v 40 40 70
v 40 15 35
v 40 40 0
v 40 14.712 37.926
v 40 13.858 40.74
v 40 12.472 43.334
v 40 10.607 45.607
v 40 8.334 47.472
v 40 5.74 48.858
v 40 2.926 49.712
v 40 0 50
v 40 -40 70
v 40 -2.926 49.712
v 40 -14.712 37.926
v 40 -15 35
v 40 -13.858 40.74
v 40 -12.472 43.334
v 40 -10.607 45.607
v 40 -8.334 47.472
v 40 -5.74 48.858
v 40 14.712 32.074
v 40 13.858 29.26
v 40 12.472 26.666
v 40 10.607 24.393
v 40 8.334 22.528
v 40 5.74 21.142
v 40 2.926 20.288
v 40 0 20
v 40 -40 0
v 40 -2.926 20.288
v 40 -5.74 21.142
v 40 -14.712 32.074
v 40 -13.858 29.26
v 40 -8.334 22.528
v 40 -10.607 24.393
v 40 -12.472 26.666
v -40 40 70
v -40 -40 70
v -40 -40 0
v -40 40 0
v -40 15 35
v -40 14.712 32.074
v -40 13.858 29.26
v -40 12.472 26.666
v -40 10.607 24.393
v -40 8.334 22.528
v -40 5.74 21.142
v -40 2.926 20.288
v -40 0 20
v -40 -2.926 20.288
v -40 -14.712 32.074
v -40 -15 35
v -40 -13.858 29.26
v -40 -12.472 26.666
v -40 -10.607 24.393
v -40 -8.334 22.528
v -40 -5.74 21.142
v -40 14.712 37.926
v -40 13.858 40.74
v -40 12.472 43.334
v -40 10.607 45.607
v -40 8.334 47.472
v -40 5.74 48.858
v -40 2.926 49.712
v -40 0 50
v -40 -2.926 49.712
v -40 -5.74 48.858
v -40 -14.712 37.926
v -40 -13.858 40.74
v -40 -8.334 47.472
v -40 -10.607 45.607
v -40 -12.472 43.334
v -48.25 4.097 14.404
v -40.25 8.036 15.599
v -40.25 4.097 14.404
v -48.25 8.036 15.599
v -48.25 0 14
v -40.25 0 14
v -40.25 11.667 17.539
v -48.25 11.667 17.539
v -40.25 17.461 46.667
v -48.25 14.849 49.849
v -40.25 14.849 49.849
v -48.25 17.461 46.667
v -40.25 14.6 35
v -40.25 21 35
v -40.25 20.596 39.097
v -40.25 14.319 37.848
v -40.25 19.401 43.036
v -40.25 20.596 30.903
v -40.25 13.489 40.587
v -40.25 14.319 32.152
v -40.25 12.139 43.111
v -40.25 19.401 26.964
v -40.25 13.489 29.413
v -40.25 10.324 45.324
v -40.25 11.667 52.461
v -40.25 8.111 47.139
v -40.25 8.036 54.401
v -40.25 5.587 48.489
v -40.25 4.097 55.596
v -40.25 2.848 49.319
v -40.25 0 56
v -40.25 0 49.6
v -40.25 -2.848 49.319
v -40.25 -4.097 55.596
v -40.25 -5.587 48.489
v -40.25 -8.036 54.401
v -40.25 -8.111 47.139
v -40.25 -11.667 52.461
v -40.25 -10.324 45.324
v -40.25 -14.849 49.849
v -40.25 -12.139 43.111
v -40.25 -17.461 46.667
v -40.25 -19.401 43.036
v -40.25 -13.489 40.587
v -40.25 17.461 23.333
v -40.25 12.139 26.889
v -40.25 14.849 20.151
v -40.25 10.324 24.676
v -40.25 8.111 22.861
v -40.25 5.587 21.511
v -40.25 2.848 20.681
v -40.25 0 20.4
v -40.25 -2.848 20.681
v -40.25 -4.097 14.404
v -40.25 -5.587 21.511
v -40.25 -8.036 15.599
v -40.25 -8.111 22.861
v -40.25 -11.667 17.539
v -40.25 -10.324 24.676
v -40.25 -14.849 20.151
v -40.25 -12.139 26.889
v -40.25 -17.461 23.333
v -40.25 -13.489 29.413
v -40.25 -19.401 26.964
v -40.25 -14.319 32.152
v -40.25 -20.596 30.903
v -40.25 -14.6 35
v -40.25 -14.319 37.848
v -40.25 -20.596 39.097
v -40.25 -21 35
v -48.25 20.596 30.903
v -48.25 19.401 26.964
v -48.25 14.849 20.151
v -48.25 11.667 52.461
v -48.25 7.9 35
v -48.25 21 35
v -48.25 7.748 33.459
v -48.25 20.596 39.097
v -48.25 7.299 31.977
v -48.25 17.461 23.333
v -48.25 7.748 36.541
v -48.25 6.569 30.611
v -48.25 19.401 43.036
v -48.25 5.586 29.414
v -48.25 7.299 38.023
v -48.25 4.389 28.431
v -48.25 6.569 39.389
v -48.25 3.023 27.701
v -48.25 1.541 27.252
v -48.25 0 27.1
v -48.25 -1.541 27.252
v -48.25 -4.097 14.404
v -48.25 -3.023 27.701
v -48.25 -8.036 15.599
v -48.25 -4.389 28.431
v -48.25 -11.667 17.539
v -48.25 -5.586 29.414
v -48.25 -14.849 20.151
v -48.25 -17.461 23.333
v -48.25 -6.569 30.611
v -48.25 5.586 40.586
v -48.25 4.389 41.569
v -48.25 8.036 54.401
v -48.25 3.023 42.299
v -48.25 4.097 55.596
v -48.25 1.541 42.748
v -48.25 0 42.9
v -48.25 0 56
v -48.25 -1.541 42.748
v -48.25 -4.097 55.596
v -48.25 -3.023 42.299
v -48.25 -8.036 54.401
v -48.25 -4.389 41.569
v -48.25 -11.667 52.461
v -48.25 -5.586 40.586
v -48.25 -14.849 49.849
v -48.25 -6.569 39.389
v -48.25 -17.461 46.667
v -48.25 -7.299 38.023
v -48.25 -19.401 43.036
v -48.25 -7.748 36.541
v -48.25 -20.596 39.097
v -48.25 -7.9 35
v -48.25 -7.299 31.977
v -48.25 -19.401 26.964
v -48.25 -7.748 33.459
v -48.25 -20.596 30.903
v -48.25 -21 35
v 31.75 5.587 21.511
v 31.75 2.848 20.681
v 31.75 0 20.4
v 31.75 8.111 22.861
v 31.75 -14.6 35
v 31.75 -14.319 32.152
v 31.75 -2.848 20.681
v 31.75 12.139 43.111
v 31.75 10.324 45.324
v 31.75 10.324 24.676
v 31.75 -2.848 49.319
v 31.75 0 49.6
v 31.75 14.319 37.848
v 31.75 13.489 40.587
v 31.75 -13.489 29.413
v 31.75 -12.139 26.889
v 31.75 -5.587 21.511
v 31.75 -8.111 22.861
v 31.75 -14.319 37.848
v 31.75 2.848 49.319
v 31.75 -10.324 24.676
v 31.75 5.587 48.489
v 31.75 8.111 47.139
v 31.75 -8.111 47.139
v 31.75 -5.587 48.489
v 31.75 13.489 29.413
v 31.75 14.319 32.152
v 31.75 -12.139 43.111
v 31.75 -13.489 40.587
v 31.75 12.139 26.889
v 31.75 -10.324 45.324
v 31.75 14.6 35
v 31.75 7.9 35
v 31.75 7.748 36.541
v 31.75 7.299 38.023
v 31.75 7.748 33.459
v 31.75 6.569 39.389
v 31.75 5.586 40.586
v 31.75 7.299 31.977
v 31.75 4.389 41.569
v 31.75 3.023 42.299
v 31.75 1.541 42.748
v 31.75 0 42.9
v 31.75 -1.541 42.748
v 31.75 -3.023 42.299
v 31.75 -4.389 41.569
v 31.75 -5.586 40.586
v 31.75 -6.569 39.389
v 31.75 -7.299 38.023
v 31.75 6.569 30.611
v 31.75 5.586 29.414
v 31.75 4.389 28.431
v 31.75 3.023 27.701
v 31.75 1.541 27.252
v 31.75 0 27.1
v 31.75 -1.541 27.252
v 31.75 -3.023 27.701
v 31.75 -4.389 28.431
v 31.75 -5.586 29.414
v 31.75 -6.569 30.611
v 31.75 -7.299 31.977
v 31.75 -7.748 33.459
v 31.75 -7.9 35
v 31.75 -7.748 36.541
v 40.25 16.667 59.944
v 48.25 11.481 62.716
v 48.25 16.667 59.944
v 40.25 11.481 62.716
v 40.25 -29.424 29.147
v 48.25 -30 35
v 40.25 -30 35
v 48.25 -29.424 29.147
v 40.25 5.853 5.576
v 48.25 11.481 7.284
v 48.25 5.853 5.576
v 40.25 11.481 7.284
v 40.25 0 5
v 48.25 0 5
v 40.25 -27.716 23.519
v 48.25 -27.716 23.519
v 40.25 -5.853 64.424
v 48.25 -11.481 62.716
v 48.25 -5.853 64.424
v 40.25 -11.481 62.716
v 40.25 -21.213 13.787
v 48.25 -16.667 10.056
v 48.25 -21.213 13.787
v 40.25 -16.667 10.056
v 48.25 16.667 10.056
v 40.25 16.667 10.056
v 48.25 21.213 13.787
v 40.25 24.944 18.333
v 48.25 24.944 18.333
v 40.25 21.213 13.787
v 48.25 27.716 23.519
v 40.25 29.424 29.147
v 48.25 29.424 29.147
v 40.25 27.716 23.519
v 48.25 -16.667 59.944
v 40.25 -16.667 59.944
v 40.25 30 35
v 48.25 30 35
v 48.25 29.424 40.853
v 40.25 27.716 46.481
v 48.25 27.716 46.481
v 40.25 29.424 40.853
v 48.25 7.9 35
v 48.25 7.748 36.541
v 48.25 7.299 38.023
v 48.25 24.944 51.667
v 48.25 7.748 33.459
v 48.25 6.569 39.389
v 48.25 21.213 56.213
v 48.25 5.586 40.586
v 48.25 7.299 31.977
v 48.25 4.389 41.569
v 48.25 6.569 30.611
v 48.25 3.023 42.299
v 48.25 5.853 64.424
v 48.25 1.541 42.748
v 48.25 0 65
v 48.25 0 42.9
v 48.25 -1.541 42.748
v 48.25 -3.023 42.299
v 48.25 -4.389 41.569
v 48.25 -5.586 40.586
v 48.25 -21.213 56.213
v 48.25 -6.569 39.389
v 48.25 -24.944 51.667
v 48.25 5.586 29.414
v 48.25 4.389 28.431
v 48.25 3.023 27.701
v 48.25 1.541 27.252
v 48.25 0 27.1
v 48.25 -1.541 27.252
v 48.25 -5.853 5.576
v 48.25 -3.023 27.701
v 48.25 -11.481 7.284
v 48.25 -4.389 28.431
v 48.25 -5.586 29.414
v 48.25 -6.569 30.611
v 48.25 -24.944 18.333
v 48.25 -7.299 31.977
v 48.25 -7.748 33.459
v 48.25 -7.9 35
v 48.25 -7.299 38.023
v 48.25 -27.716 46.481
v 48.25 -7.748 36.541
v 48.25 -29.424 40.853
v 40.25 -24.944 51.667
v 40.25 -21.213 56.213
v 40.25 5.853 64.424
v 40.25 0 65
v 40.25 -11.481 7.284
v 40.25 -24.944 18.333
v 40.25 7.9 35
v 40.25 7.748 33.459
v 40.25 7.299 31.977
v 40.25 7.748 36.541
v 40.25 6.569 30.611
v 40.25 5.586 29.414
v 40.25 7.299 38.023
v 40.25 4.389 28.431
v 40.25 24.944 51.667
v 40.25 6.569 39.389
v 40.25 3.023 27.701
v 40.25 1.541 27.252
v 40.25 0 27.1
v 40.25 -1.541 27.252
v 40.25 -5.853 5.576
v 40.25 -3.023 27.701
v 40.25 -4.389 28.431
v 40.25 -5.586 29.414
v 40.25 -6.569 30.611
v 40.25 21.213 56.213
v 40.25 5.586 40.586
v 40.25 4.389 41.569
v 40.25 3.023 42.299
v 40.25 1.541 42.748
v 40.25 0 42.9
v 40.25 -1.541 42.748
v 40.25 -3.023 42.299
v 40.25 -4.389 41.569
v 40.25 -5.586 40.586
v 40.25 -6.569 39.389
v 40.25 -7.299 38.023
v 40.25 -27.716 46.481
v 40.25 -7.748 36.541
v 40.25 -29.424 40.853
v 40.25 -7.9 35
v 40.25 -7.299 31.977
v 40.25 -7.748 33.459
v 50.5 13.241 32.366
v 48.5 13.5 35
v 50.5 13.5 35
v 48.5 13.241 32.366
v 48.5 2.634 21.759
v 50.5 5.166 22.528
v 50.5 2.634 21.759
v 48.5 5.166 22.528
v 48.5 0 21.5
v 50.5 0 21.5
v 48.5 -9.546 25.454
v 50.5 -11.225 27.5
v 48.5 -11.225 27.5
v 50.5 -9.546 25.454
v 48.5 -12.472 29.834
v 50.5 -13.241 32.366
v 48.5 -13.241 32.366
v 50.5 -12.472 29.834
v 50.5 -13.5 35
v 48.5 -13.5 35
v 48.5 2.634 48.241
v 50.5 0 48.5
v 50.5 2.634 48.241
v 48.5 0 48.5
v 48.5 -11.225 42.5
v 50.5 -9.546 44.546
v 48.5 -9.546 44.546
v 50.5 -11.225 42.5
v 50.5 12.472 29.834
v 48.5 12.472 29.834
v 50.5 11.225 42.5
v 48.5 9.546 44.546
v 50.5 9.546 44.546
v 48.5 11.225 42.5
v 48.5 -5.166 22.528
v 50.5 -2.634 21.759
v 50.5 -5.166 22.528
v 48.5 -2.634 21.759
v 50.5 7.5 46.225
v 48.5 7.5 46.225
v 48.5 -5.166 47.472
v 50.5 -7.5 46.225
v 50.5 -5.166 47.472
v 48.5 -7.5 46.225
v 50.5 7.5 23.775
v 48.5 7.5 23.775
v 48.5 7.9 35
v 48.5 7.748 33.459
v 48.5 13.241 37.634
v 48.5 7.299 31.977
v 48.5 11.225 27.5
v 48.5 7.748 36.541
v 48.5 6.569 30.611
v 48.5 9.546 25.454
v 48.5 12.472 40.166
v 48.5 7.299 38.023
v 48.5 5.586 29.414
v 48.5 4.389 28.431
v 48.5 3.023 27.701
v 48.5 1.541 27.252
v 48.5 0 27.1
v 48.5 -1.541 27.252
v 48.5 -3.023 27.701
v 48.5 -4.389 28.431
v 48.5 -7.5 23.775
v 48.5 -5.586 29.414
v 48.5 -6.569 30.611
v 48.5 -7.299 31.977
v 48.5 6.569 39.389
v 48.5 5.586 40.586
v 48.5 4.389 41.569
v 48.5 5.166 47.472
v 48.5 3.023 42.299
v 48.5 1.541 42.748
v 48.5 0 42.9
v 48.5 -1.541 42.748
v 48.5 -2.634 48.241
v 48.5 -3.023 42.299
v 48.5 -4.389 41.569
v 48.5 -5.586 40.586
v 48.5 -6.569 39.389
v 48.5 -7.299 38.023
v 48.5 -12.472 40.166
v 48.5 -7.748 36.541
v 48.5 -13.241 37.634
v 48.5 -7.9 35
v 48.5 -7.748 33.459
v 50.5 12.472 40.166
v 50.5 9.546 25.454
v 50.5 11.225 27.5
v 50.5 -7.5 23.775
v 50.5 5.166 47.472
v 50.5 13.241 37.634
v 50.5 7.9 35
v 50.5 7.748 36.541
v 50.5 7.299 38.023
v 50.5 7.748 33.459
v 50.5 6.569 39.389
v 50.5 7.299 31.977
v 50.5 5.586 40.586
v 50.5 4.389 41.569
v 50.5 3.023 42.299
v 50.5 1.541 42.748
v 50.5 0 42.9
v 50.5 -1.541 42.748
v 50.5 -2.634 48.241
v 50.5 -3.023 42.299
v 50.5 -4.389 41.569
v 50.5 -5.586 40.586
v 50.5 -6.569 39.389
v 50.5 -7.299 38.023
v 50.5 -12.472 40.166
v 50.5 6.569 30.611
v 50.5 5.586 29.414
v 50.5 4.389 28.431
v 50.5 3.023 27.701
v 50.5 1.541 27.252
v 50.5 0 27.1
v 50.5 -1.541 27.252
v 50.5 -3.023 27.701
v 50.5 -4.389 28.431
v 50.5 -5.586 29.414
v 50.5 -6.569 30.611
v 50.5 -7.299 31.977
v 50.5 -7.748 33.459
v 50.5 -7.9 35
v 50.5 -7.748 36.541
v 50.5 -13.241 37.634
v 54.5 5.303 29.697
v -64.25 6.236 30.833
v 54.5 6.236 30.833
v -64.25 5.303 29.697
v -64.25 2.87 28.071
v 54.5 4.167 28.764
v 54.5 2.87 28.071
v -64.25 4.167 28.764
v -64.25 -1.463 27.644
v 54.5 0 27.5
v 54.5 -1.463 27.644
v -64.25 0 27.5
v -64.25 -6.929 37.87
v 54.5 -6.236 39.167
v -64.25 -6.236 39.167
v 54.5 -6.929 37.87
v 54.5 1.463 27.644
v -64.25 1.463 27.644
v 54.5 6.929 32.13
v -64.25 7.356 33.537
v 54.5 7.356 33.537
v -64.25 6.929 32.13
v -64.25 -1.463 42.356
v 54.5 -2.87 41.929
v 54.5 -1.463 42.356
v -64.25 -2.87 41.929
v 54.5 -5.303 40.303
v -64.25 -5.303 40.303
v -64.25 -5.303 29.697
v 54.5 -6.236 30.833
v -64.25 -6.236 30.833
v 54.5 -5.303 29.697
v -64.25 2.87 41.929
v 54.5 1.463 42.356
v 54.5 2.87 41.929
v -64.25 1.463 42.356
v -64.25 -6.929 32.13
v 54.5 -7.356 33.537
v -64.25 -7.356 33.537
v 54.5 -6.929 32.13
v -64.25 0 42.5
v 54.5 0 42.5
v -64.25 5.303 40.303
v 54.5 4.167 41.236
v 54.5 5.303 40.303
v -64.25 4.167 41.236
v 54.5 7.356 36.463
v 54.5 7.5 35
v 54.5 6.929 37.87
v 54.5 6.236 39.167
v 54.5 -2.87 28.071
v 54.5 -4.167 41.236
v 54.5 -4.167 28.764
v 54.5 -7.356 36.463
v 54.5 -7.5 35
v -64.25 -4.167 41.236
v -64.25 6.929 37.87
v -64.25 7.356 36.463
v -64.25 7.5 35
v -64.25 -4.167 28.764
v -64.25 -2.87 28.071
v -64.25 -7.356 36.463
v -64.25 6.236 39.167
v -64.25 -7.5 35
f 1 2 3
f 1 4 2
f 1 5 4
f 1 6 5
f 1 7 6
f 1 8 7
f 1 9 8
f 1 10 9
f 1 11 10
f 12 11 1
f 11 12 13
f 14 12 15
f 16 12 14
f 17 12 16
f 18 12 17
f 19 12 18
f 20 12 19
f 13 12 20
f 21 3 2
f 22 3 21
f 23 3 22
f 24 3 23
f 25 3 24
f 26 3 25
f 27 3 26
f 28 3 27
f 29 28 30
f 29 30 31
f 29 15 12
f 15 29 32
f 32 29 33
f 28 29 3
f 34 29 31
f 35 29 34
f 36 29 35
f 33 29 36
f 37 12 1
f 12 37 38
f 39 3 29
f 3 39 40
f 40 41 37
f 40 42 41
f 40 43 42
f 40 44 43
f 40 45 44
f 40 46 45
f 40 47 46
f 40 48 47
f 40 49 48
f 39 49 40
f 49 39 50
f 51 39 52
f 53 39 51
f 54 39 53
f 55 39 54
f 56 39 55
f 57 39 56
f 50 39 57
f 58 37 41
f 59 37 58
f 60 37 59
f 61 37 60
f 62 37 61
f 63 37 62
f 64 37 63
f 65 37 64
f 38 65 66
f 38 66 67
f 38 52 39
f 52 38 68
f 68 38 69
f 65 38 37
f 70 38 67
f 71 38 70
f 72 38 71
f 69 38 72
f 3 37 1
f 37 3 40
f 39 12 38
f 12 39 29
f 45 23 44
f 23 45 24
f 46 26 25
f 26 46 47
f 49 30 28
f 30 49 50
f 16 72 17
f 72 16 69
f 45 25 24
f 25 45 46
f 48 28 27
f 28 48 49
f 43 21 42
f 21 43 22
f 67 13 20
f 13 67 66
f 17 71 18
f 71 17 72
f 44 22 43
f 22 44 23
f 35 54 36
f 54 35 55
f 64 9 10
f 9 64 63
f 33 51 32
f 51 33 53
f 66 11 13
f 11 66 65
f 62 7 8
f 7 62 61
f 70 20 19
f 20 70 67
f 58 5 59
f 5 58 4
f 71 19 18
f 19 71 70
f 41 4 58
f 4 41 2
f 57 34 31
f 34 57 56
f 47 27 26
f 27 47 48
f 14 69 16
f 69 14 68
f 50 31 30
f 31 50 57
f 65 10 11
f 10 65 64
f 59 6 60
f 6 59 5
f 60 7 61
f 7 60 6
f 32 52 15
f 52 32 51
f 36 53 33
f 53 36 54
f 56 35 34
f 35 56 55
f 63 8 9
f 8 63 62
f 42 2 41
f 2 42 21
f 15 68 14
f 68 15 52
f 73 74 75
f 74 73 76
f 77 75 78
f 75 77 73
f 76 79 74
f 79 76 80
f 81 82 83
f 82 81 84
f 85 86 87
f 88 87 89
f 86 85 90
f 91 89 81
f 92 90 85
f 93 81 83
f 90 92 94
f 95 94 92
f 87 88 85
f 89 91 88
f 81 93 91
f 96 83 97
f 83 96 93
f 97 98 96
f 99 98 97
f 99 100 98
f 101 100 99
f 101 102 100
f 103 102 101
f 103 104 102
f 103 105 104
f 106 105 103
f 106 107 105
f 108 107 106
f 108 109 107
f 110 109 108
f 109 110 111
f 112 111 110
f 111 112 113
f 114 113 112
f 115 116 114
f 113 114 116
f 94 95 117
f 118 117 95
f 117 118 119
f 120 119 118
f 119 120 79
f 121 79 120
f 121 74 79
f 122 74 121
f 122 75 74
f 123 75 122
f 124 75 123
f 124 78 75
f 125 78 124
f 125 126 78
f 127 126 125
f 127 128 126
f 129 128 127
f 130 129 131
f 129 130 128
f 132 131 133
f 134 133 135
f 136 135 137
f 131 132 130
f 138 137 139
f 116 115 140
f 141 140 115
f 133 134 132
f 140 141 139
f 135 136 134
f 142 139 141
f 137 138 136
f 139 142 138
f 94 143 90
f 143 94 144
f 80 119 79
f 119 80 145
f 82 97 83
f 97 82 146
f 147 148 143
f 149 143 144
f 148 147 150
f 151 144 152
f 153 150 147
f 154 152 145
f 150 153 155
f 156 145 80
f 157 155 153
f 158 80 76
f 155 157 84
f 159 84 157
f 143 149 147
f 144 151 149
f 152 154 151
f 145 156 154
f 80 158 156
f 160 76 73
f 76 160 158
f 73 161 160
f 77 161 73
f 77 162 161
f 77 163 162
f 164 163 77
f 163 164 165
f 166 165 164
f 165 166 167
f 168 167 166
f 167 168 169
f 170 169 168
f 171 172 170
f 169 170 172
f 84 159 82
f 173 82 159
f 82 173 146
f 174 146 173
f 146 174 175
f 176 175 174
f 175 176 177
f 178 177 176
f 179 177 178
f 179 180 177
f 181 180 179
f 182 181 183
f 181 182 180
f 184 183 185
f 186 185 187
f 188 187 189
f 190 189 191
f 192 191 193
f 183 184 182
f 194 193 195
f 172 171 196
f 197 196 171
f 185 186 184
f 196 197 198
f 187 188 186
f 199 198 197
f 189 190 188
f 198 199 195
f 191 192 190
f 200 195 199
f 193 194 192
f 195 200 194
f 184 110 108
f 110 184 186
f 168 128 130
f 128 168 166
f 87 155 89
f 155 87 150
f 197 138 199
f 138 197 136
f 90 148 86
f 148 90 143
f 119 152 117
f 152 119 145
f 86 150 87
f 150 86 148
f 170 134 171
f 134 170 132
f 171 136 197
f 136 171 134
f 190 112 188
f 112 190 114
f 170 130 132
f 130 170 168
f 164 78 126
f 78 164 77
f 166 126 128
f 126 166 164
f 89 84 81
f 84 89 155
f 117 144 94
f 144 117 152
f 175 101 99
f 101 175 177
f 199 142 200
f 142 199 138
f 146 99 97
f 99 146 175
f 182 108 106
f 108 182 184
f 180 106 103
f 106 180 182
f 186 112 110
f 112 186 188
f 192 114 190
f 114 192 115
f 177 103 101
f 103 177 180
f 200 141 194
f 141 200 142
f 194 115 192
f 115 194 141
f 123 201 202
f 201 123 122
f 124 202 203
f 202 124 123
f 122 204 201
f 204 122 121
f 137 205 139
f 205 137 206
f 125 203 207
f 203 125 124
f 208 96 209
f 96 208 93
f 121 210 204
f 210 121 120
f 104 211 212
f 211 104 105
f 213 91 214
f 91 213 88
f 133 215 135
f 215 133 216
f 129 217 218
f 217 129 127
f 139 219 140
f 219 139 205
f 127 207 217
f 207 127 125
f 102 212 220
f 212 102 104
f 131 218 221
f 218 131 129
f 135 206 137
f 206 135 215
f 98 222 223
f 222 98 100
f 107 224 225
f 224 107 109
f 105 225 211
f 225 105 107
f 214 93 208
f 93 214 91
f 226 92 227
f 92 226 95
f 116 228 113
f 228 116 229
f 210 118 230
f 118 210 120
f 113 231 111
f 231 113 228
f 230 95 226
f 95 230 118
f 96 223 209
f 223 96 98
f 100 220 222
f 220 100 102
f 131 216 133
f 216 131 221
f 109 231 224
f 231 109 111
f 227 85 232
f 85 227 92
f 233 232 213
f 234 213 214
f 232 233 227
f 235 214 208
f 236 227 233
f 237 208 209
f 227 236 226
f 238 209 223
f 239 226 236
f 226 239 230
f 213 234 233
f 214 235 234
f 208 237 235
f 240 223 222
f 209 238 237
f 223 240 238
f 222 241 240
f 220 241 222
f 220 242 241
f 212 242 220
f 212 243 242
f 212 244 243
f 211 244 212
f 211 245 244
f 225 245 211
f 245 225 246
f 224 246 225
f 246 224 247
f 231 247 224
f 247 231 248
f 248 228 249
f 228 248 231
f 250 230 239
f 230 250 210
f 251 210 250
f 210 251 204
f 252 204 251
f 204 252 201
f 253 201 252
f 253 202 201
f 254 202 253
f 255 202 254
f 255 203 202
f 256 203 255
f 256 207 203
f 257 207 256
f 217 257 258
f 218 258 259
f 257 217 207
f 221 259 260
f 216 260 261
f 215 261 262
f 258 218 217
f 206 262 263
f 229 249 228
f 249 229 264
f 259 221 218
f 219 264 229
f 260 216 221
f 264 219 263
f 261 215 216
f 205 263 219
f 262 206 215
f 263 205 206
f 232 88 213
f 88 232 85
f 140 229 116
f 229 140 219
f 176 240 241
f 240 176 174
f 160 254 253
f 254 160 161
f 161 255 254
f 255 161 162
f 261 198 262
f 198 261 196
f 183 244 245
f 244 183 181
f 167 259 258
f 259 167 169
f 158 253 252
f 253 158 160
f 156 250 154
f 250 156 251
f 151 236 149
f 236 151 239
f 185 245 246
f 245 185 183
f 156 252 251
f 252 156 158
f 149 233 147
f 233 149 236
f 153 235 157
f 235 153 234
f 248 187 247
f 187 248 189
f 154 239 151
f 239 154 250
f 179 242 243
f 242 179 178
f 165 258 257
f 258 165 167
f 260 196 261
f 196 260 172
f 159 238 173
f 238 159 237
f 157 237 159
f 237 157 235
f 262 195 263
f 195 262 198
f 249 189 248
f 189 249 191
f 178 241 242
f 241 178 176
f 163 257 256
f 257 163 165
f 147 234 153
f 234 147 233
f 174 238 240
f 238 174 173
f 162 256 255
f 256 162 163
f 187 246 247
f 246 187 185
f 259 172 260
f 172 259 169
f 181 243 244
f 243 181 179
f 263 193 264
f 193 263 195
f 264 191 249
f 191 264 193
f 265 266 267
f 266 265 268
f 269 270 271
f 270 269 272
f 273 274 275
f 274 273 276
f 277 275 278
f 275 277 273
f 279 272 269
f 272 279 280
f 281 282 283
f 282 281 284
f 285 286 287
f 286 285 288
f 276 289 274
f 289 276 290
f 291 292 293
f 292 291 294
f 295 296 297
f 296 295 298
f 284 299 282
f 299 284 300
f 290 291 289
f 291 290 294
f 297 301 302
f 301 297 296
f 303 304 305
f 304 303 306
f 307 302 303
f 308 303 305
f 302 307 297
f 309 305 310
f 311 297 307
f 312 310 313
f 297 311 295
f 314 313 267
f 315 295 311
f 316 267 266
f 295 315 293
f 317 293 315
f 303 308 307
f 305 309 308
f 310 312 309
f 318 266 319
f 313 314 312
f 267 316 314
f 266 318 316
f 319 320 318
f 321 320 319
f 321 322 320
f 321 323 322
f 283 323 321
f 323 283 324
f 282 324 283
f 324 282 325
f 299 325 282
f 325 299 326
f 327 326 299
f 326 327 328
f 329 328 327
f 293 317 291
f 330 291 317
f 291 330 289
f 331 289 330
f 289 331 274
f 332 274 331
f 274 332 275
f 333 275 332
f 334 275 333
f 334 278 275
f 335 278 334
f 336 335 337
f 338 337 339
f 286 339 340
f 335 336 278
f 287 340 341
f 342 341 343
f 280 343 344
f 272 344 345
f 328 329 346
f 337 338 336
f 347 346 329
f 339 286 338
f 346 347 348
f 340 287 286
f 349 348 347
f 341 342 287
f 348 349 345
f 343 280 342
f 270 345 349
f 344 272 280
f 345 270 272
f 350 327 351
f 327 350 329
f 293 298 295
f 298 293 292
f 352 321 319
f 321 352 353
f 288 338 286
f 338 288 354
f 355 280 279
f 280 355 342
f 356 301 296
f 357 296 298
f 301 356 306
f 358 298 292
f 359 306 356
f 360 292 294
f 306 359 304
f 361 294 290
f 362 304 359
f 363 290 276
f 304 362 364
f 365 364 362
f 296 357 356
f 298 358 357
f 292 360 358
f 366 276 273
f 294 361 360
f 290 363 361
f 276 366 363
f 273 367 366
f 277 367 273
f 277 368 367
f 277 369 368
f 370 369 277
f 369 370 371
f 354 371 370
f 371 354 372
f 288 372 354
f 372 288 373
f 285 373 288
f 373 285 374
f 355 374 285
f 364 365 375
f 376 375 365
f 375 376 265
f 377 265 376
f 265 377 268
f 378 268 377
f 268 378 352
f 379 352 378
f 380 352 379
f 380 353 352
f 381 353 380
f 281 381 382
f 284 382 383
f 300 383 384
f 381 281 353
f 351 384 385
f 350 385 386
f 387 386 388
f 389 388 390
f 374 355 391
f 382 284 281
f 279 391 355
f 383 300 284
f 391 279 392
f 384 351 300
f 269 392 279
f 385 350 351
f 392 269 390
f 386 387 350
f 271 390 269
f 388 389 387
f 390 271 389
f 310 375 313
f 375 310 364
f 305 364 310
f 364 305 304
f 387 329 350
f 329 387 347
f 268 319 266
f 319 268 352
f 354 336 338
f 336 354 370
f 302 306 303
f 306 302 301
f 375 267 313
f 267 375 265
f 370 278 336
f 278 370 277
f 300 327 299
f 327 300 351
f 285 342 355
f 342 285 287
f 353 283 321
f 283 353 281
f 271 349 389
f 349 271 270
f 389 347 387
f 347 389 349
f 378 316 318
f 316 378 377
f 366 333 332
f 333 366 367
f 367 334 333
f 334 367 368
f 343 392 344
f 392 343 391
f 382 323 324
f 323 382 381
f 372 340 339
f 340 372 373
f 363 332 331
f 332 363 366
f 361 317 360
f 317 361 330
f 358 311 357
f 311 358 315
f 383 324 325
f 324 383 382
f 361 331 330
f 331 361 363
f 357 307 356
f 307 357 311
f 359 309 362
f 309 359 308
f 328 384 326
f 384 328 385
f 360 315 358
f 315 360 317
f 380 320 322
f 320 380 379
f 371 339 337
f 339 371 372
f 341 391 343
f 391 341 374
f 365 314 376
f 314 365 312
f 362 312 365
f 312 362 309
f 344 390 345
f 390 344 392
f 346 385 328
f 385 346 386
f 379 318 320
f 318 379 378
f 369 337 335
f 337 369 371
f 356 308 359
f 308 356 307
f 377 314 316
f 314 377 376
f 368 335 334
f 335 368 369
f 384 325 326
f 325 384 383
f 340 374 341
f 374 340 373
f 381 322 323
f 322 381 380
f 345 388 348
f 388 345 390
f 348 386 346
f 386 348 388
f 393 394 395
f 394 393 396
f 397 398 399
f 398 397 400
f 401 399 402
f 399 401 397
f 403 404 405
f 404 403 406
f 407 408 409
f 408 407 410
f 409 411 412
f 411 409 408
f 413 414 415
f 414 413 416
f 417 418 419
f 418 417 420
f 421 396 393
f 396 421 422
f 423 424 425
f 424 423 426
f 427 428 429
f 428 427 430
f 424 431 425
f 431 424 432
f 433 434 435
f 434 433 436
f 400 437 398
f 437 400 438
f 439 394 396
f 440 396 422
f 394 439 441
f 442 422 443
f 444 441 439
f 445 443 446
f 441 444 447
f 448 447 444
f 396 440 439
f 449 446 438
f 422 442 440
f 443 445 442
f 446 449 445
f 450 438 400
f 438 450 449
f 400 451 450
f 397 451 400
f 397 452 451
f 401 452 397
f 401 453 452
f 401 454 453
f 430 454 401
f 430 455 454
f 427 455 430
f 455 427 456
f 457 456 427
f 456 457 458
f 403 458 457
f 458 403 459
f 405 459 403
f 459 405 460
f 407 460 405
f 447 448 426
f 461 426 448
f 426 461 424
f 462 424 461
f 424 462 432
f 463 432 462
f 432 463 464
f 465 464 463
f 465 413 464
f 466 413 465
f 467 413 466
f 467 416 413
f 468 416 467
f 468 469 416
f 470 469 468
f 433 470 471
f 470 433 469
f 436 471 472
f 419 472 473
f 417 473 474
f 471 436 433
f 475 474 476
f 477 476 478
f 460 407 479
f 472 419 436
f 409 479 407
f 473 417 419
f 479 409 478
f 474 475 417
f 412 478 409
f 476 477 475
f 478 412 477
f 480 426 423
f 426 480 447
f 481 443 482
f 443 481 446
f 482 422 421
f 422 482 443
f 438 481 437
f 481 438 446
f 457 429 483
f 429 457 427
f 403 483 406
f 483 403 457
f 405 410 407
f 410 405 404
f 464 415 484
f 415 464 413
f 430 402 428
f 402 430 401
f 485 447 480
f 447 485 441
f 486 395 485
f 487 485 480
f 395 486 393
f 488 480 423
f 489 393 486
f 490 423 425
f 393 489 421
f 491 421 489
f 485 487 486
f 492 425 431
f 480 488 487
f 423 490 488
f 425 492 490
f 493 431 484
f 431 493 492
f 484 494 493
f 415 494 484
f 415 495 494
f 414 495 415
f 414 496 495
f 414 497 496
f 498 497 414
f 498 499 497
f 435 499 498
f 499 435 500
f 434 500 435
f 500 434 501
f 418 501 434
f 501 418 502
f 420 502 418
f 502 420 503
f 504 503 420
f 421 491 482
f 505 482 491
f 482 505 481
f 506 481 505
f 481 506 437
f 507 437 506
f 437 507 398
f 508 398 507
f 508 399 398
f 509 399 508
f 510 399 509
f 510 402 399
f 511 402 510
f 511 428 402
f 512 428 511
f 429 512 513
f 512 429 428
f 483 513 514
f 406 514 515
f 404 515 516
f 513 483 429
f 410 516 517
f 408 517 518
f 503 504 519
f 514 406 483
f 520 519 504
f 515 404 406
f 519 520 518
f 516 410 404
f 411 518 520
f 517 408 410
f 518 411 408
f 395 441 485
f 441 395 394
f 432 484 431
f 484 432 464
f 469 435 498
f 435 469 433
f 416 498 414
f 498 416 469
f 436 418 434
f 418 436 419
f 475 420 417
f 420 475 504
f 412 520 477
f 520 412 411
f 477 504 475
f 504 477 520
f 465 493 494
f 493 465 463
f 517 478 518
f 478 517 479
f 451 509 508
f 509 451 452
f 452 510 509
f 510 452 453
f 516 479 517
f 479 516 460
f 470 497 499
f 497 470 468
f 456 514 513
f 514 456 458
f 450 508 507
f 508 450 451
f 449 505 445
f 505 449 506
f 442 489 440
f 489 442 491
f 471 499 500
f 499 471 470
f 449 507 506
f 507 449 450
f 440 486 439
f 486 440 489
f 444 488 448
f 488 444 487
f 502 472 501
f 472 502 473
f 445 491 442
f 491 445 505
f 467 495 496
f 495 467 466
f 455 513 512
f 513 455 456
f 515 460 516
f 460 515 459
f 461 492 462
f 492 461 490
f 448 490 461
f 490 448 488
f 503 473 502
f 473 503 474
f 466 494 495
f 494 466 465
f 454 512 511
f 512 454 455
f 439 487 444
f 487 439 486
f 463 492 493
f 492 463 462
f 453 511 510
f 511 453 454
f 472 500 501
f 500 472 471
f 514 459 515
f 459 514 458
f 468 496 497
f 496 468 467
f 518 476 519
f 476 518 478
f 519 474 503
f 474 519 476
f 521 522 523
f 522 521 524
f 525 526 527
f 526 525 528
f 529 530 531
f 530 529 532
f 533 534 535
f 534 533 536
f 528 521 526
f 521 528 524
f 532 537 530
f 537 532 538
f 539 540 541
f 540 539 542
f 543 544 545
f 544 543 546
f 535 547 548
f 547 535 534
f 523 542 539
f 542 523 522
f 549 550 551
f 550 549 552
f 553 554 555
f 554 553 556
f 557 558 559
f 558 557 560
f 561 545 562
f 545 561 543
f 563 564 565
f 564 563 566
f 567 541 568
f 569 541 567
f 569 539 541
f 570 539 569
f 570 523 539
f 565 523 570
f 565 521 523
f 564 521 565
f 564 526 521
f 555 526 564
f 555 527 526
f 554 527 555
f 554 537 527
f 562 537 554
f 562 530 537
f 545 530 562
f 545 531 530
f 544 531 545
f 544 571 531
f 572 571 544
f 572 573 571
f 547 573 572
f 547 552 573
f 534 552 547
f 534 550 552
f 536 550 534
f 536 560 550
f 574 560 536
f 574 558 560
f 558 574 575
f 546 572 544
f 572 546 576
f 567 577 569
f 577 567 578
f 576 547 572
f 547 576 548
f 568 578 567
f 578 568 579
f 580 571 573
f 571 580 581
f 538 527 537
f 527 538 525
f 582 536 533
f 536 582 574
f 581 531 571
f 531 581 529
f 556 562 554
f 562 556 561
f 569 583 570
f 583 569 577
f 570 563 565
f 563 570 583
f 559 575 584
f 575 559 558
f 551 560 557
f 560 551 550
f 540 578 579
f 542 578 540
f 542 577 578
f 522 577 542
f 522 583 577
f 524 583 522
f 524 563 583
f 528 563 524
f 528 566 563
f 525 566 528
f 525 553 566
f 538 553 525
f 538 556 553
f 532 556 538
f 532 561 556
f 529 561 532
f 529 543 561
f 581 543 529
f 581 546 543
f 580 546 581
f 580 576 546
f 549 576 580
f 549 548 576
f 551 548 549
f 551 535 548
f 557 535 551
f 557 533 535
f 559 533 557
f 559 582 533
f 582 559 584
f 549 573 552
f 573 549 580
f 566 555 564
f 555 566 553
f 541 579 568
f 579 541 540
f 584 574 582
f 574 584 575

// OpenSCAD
$fn = 32;

// ------------------------------------------------------------------------
// Bushed housing: 80 x 80 x 70 mm housing, bushing d29.2
// Every part is its own module, assembly() places them once.
// ------------------------------------------------------------------------

// --- part 1 ---
module housing() {
  difference() {
    translate([-40, -40, 0]) cube([80, 80, 70]);
    translate([0, 0, 35]) rotate([0, 90, 0]) cylinder(h = 82, d = 30, center = true);
  }
}

// --- part 2 ---
module bushing() {
  difference() {
    union() {
      cylinder(h = 8, d = 42);
      translate([0, 0, 8]) cylinder(h = 72, d = 29.2);
    }
    translate([0, 0, -1]) cylinder(h = 82, d = 15.8);
  }
}

// --- part 3 ---
module shaft() {
  translate([0, 0, -59.375]) cylinder(h = 118.75, d = 15);
}

// --- part 4 ---
module cover() {
  difference() {
    cylinder(h = 8, d = 60);
    translate([0, 0, -1]) cylinder(h = 10, d = 15.8);
  }
}

// --- part 5 ---
module washer() {
  difference() {
      translate([0, 0, 0]) cylinder(h = 2, d = 27);
      translate([0, 0, -1]) cylinder(h = 4, d = 15.8);
    }
}

// --- assembly ---
module assembly() {
  translate([0, 0, 0]) rotate([0, 0, 0]) housing();
  translate([-48.25, 0, 35]) rotate([0, 90, 0]) bushing();
  translate([-4.875, 0, 35]) rotate([0, 90, 0]) shaft();
  translate([40.25, 0, 35]) rotate([0, 90, 0]) cover();
  translate([48.5, 0, 35]) rotate([0, 90, 0]) washer();
}

assembly();
